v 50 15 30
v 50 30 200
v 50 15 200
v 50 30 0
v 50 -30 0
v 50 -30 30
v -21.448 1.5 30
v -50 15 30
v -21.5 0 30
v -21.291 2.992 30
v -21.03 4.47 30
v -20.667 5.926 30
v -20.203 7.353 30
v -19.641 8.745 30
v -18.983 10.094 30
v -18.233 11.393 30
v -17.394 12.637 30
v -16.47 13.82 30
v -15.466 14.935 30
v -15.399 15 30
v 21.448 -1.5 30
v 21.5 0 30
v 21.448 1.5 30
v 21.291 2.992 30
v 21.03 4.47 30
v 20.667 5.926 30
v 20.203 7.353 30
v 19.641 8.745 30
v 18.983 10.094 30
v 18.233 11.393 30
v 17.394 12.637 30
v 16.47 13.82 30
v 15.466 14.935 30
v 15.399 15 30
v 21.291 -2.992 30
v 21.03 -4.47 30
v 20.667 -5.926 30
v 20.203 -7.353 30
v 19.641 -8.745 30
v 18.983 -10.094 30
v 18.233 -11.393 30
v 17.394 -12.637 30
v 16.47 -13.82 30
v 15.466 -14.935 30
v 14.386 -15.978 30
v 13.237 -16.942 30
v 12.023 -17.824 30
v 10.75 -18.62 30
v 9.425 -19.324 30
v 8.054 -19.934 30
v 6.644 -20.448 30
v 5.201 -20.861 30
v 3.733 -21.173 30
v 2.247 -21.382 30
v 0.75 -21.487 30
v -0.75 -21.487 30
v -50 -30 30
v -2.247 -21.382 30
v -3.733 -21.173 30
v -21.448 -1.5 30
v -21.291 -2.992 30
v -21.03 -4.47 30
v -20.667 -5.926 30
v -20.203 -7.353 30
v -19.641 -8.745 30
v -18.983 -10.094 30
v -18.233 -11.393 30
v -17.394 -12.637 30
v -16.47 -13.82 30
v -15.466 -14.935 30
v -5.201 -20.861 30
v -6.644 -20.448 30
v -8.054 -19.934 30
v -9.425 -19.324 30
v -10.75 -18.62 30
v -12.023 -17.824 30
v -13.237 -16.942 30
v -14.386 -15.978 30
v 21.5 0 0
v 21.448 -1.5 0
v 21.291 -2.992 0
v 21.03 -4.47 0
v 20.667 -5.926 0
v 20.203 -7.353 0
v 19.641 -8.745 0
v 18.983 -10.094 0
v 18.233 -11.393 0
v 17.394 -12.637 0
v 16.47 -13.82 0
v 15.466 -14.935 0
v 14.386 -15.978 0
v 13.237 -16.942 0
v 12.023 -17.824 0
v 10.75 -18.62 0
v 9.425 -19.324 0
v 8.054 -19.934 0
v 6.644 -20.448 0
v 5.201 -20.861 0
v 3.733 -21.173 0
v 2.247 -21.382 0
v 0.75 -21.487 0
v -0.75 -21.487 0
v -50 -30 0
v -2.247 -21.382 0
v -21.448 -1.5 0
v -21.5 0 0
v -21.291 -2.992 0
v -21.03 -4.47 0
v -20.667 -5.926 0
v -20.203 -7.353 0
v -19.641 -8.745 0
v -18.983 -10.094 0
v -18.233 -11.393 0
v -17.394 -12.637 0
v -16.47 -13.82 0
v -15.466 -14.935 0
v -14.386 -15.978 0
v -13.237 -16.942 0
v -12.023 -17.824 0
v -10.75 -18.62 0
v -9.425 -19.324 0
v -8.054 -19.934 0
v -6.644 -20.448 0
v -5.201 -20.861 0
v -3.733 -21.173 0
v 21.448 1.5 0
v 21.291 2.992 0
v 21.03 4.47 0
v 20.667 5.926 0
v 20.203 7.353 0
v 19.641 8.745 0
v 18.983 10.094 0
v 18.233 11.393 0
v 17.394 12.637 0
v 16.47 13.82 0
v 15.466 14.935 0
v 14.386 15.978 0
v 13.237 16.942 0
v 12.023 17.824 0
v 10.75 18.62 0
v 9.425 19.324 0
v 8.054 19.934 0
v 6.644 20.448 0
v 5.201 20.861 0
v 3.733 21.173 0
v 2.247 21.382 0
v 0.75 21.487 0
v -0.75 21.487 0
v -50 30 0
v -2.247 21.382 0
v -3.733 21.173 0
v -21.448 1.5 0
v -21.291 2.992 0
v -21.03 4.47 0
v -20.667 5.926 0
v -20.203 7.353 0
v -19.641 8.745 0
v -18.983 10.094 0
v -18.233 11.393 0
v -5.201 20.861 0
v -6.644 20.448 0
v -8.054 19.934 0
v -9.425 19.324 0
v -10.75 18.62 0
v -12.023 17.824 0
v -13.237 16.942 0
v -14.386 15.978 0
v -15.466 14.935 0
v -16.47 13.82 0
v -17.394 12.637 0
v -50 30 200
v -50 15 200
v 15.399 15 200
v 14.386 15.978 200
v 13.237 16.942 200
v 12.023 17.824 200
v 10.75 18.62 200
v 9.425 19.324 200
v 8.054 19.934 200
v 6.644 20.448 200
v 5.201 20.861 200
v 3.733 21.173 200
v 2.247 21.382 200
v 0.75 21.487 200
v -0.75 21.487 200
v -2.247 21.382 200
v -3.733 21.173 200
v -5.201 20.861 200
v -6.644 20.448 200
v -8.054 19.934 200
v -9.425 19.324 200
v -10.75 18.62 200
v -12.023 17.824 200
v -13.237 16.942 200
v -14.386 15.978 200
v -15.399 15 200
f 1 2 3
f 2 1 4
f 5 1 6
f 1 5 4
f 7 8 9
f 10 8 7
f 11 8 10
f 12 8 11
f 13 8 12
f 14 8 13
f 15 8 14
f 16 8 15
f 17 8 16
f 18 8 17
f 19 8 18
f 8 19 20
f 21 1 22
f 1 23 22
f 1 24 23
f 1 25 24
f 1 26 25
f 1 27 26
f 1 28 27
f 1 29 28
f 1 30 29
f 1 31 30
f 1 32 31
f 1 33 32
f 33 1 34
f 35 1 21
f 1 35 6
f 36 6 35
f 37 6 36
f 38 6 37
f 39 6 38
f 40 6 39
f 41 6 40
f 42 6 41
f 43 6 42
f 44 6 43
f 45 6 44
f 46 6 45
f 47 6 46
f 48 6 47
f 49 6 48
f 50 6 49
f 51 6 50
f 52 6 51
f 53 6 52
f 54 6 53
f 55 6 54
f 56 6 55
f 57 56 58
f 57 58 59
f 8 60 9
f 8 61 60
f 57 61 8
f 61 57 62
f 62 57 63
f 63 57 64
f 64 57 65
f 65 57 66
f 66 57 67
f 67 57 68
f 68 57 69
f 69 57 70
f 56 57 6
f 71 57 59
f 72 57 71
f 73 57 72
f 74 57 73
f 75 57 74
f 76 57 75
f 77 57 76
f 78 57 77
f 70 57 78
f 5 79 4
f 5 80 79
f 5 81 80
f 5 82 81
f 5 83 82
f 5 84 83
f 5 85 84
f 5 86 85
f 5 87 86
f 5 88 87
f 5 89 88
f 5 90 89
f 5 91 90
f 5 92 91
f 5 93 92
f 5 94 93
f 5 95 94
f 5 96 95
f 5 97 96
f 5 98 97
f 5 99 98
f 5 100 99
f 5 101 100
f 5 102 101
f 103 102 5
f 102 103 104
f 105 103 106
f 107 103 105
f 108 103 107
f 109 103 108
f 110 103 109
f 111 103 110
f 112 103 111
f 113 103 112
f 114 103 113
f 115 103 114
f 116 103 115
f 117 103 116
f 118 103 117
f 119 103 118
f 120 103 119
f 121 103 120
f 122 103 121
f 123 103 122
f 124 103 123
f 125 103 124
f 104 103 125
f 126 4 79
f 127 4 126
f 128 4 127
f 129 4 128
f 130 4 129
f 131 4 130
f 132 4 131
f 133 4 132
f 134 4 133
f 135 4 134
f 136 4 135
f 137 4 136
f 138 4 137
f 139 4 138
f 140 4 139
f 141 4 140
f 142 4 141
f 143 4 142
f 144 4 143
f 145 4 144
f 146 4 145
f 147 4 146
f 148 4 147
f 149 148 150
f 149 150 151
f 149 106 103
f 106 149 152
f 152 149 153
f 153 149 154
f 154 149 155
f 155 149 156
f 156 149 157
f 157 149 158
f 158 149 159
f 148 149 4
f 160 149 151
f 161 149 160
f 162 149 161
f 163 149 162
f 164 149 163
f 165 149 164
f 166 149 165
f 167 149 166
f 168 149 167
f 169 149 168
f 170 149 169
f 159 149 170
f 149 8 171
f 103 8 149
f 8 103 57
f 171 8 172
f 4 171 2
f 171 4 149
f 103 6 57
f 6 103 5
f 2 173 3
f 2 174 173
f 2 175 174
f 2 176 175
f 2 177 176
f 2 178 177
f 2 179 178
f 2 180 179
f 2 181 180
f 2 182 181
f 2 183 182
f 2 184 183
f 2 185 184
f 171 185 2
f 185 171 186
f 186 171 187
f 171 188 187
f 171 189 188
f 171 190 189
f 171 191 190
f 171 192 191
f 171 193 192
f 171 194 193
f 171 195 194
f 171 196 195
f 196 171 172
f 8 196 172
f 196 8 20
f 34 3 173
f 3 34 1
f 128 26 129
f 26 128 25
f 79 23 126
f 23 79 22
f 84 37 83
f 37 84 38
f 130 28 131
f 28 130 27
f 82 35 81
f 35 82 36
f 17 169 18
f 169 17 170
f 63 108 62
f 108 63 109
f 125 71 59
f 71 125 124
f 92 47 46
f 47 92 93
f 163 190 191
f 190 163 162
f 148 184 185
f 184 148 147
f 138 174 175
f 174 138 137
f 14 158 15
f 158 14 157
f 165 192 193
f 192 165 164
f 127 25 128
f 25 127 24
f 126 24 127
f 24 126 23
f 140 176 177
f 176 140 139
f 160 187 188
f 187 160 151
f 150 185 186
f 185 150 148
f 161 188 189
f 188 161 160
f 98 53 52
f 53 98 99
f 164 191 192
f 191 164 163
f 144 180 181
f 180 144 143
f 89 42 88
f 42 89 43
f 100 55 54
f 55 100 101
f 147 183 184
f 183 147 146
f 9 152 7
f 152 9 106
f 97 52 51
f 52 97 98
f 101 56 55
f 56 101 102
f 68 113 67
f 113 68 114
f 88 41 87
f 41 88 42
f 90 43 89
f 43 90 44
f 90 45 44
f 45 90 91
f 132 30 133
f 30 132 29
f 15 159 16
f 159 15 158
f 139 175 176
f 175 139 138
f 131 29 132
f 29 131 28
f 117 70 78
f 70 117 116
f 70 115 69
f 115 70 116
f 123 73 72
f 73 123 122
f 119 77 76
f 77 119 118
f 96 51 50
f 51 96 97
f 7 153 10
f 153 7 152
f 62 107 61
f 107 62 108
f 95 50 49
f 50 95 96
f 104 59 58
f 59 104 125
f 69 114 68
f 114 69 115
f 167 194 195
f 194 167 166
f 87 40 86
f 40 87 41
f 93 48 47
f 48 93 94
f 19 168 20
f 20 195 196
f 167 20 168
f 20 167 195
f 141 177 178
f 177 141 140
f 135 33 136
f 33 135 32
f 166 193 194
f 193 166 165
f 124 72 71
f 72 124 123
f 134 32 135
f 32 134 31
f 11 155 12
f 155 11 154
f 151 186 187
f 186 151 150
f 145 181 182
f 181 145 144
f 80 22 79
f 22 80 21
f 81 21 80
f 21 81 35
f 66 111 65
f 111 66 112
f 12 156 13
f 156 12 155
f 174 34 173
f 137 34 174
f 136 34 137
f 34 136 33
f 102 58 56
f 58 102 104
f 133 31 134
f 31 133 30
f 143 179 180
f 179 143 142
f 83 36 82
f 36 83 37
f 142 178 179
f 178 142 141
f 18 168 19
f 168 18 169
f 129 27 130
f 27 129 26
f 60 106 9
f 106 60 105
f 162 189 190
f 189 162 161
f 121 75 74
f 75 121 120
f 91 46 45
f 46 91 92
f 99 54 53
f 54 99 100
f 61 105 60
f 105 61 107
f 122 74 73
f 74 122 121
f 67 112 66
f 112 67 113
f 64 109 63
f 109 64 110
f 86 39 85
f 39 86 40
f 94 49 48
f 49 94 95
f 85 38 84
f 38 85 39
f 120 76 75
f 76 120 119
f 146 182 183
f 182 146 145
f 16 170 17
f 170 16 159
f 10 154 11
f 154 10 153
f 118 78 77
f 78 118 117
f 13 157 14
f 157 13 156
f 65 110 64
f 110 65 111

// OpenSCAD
$fn = 90;

wall_thickness = 15;
center_distance = 15;

total_height = 200;
total_length = 100;
total_width = 2*wall_thickness + 2*center_distance;
drillMount_height = 30;


difference(){
	union(){
		translate([0, 0, drillMount_height/2])
			cube([total_length, total_width, drillMount_height], center=true);
		translate([0, total_width/2-wall_thickness/2, total_height/2])
			cube([total_length, wall_thickness, total_height], center=true);
	}
	#cylinder(d=43, h=total_height);
}
